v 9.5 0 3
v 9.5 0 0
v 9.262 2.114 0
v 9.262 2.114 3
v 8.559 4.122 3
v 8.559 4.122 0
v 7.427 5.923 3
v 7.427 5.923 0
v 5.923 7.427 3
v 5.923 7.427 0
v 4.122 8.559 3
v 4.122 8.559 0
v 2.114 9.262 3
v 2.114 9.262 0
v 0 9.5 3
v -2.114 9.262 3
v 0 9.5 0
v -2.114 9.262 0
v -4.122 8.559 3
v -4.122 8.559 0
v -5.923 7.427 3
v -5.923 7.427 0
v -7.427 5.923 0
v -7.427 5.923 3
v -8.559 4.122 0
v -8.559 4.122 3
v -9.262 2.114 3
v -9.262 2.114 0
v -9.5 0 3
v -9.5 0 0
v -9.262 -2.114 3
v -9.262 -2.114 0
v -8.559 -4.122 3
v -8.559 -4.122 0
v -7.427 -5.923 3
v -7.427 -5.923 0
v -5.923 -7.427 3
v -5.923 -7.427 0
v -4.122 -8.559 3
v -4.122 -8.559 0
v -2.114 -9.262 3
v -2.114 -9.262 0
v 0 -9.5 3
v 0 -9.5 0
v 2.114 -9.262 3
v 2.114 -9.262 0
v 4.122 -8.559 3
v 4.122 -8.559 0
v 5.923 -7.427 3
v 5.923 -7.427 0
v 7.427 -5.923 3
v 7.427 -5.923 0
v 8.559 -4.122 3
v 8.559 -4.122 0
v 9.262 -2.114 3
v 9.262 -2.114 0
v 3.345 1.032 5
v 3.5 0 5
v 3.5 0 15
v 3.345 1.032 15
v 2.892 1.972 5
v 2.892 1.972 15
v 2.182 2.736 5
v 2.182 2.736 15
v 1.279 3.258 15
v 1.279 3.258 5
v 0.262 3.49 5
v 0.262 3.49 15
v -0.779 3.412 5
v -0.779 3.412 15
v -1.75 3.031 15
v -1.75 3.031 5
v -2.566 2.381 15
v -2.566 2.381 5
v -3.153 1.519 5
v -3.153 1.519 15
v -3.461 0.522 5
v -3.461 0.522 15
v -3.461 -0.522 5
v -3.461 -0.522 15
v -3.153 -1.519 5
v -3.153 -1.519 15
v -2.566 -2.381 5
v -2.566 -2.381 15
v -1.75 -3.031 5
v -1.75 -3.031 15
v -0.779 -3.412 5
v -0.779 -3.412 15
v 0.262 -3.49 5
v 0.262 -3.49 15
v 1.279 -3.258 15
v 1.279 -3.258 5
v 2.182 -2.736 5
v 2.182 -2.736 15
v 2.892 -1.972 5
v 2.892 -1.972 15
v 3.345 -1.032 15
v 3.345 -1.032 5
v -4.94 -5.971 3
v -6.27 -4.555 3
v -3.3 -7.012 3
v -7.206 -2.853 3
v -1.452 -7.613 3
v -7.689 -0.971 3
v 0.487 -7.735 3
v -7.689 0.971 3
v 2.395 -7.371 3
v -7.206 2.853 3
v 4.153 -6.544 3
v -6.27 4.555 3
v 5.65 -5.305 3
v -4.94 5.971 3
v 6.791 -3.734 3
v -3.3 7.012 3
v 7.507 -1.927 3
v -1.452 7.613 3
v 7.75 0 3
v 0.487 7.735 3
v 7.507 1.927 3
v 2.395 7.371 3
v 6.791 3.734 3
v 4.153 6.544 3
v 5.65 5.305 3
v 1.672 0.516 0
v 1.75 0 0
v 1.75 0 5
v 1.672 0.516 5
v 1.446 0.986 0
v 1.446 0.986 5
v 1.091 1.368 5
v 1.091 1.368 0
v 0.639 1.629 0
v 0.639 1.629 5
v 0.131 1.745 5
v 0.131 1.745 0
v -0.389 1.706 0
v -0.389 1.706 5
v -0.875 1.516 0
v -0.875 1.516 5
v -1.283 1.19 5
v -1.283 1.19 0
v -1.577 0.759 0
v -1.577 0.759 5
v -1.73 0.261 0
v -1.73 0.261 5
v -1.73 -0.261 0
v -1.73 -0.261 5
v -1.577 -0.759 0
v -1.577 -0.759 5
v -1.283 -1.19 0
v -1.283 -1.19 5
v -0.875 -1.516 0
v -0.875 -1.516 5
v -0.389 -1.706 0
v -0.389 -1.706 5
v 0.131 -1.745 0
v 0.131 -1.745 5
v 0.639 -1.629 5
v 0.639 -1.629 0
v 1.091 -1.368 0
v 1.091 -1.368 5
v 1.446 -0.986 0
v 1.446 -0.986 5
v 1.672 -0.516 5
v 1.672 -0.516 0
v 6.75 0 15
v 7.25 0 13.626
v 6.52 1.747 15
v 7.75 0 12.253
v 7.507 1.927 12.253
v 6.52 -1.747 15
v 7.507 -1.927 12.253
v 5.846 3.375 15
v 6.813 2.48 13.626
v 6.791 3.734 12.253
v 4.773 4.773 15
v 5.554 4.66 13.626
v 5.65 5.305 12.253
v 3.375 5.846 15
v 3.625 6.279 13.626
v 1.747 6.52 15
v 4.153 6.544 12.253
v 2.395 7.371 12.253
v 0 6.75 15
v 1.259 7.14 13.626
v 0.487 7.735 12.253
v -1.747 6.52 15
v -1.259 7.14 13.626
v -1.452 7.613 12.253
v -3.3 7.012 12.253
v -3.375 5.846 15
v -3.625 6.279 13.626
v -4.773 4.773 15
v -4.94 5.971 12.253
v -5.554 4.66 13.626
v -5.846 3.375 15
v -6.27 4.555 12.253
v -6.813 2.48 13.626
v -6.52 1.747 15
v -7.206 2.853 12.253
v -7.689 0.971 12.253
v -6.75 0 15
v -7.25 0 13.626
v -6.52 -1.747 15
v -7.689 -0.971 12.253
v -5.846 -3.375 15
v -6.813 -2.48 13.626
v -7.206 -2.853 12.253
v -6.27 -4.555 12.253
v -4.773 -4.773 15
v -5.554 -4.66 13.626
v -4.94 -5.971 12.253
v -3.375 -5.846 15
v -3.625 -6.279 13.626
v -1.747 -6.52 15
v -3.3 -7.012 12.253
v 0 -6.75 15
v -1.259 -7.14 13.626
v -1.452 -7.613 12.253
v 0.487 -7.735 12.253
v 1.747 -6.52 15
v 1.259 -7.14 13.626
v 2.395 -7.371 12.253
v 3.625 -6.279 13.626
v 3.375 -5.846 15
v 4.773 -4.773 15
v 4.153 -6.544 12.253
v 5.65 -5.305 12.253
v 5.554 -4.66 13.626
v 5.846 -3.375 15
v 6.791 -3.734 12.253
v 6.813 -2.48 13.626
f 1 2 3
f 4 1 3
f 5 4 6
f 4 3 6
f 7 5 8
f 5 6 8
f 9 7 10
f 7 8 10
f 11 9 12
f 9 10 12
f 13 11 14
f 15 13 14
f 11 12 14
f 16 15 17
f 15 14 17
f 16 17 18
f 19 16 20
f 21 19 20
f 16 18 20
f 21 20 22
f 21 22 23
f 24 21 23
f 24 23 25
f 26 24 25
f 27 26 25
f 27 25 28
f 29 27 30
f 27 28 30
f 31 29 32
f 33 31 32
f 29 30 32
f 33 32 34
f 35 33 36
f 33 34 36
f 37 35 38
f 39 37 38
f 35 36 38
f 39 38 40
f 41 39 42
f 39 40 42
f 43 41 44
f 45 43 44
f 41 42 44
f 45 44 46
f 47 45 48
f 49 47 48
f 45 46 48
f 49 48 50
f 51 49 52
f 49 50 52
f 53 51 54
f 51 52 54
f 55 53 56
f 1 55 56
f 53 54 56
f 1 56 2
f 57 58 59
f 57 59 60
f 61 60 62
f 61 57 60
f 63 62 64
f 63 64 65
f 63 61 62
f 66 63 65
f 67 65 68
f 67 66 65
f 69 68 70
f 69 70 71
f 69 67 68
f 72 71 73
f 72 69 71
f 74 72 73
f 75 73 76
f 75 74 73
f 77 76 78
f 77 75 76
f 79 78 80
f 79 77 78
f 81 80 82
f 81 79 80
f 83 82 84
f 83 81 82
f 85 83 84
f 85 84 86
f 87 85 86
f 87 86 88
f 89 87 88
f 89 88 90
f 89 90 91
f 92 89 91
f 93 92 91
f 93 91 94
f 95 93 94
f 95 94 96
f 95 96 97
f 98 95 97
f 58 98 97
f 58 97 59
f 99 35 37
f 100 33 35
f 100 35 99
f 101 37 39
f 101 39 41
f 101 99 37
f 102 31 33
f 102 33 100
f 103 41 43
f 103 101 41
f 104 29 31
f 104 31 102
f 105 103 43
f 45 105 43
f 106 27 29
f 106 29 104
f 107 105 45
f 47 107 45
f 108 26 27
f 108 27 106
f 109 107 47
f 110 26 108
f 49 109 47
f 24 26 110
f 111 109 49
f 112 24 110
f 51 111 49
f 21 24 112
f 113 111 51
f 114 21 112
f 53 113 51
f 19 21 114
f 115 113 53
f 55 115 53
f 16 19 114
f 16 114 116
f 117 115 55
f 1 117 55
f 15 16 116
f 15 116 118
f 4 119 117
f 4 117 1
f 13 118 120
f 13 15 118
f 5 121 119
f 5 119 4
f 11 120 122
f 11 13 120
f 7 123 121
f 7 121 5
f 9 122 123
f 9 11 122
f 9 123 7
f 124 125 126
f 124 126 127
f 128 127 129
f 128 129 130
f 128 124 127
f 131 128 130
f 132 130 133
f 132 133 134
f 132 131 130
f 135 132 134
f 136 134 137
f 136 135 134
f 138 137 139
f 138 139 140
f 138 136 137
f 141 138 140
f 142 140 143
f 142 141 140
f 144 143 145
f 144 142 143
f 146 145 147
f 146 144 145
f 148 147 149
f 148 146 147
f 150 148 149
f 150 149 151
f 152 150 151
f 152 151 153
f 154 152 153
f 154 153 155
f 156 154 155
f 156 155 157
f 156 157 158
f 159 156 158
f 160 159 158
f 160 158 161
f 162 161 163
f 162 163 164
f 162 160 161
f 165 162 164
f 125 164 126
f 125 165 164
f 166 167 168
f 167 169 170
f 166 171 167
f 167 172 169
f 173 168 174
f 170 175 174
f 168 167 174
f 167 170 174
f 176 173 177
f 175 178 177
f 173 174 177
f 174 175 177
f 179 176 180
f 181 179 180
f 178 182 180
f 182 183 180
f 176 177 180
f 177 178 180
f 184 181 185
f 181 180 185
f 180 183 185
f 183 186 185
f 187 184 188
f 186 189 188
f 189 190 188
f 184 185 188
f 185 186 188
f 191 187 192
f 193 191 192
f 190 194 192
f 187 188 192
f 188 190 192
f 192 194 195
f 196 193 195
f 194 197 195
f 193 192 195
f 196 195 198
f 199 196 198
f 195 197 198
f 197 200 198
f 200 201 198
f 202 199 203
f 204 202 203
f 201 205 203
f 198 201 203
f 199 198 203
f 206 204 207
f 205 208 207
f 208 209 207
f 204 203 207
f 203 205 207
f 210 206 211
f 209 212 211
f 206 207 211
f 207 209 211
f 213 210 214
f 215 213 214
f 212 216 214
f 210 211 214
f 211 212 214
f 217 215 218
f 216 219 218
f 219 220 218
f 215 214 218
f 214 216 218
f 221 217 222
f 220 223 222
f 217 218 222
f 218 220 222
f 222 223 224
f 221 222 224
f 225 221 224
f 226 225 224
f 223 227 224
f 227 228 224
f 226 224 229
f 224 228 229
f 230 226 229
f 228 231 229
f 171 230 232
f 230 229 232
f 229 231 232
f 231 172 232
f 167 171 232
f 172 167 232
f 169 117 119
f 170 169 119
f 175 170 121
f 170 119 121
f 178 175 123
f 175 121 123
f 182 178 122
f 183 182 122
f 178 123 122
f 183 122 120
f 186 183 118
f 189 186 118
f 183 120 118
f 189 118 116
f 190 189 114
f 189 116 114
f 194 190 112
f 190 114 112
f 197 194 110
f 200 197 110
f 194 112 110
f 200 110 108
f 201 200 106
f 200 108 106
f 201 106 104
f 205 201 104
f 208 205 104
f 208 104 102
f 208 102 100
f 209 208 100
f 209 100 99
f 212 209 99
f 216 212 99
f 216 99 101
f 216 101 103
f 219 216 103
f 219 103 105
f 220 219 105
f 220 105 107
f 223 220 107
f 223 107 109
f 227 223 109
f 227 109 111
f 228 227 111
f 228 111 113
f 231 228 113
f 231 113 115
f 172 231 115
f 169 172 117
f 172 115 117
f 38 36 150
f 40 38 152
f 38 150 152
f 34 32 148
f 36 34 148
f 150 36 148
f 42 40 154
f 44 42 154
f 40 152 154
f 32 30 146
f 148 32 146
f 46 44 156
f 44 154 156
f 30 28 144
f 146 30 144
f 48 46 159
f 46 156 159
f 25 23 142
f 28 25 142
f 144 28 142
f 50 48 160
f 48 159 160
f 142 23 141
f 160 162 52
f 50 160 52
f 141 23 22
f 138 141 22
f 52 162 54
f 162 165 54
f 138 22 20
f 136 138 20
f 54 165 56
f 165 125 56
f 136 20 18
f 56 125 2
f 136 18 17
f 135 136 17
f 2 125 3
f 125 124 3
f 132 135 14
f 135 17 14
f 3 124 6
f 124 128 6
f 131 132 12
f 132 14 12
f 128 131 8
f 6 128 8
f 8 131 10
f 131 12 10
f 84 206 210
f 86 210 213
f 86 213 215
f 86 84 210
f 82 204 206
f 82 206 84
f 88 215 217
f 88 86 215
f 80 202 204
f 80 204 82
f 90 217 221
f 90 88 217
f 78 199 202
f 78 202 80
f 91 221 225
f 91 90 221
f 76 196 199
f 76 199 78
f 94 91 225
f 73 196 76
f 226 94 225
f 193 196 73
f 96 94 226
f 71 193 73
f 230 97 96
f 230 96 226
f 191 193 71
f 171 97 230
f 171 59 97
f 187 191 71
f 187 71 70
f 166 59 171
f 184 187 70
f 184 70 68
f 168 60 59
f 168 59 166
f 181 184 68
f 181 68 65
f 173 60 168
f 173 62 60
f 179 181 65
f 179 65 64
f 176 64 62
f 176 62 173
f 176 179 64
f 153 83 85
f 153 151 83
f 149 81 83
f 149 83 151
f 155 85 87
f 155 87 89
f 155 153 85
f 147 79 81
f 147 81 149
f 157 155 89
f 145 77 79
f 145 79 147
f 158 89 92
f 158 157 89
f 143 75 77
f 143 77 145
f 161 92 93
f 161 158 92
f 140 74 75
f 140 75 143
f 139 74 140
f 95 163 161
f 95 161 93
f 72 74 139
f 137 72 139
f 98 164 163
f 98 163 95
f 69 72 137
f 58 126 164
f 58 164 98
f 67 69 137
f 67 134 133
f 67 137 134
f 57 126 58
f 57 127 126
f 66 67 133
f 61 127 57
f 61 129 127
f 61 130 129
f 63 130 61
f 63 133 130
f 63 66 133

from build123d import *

# Parameters (mm, degrees)
F0_R     = 9.5
F0_R_2   = 7.75
F1_DEPTH = 3
F0_R_3   = 3.5
F2_DEPTH = 15
F0_R_4   = 1.75
F3_DEPTH = 5
F4_SIZE2 = 2.747477
F4_SIZE  = 1


with BuildPart() as f1:
    # F0 (on Top) → F1 (new body)
    with BuildSketch(Plane.XY):
        Circle(F0_R)
        Circle(F0_R_2, mode=Mode.SUBTRACT)
    extrude(amount=F1_DEPTH)

    # F0 (on Top) → F2 (join)
    with BuildSketch(Plane.XY):
        Circle(F0_R_2)
        Circle(F0_R_3, mode=Mode.SUBTRACT)
    extrude(amount=F2_DEPTH)

    # F0 (on Top) → F3 (join)
    with BuildSketch(Plane.XY):
        Circle(F0_R_3)
        Circle(F0_R_4, mode=Mode.SUBTRACT)
    extrude(amount=F3_DEPTH)

    # F4
    f4_edges = [f1.edges().sort_by_distance(p)[0] for p in [
        (-7.75, 0, 15),
    ]]
    chamfer(f4_edges, length=F4_SIZE, length2=F4_SIZE2)


solid = f1.part
